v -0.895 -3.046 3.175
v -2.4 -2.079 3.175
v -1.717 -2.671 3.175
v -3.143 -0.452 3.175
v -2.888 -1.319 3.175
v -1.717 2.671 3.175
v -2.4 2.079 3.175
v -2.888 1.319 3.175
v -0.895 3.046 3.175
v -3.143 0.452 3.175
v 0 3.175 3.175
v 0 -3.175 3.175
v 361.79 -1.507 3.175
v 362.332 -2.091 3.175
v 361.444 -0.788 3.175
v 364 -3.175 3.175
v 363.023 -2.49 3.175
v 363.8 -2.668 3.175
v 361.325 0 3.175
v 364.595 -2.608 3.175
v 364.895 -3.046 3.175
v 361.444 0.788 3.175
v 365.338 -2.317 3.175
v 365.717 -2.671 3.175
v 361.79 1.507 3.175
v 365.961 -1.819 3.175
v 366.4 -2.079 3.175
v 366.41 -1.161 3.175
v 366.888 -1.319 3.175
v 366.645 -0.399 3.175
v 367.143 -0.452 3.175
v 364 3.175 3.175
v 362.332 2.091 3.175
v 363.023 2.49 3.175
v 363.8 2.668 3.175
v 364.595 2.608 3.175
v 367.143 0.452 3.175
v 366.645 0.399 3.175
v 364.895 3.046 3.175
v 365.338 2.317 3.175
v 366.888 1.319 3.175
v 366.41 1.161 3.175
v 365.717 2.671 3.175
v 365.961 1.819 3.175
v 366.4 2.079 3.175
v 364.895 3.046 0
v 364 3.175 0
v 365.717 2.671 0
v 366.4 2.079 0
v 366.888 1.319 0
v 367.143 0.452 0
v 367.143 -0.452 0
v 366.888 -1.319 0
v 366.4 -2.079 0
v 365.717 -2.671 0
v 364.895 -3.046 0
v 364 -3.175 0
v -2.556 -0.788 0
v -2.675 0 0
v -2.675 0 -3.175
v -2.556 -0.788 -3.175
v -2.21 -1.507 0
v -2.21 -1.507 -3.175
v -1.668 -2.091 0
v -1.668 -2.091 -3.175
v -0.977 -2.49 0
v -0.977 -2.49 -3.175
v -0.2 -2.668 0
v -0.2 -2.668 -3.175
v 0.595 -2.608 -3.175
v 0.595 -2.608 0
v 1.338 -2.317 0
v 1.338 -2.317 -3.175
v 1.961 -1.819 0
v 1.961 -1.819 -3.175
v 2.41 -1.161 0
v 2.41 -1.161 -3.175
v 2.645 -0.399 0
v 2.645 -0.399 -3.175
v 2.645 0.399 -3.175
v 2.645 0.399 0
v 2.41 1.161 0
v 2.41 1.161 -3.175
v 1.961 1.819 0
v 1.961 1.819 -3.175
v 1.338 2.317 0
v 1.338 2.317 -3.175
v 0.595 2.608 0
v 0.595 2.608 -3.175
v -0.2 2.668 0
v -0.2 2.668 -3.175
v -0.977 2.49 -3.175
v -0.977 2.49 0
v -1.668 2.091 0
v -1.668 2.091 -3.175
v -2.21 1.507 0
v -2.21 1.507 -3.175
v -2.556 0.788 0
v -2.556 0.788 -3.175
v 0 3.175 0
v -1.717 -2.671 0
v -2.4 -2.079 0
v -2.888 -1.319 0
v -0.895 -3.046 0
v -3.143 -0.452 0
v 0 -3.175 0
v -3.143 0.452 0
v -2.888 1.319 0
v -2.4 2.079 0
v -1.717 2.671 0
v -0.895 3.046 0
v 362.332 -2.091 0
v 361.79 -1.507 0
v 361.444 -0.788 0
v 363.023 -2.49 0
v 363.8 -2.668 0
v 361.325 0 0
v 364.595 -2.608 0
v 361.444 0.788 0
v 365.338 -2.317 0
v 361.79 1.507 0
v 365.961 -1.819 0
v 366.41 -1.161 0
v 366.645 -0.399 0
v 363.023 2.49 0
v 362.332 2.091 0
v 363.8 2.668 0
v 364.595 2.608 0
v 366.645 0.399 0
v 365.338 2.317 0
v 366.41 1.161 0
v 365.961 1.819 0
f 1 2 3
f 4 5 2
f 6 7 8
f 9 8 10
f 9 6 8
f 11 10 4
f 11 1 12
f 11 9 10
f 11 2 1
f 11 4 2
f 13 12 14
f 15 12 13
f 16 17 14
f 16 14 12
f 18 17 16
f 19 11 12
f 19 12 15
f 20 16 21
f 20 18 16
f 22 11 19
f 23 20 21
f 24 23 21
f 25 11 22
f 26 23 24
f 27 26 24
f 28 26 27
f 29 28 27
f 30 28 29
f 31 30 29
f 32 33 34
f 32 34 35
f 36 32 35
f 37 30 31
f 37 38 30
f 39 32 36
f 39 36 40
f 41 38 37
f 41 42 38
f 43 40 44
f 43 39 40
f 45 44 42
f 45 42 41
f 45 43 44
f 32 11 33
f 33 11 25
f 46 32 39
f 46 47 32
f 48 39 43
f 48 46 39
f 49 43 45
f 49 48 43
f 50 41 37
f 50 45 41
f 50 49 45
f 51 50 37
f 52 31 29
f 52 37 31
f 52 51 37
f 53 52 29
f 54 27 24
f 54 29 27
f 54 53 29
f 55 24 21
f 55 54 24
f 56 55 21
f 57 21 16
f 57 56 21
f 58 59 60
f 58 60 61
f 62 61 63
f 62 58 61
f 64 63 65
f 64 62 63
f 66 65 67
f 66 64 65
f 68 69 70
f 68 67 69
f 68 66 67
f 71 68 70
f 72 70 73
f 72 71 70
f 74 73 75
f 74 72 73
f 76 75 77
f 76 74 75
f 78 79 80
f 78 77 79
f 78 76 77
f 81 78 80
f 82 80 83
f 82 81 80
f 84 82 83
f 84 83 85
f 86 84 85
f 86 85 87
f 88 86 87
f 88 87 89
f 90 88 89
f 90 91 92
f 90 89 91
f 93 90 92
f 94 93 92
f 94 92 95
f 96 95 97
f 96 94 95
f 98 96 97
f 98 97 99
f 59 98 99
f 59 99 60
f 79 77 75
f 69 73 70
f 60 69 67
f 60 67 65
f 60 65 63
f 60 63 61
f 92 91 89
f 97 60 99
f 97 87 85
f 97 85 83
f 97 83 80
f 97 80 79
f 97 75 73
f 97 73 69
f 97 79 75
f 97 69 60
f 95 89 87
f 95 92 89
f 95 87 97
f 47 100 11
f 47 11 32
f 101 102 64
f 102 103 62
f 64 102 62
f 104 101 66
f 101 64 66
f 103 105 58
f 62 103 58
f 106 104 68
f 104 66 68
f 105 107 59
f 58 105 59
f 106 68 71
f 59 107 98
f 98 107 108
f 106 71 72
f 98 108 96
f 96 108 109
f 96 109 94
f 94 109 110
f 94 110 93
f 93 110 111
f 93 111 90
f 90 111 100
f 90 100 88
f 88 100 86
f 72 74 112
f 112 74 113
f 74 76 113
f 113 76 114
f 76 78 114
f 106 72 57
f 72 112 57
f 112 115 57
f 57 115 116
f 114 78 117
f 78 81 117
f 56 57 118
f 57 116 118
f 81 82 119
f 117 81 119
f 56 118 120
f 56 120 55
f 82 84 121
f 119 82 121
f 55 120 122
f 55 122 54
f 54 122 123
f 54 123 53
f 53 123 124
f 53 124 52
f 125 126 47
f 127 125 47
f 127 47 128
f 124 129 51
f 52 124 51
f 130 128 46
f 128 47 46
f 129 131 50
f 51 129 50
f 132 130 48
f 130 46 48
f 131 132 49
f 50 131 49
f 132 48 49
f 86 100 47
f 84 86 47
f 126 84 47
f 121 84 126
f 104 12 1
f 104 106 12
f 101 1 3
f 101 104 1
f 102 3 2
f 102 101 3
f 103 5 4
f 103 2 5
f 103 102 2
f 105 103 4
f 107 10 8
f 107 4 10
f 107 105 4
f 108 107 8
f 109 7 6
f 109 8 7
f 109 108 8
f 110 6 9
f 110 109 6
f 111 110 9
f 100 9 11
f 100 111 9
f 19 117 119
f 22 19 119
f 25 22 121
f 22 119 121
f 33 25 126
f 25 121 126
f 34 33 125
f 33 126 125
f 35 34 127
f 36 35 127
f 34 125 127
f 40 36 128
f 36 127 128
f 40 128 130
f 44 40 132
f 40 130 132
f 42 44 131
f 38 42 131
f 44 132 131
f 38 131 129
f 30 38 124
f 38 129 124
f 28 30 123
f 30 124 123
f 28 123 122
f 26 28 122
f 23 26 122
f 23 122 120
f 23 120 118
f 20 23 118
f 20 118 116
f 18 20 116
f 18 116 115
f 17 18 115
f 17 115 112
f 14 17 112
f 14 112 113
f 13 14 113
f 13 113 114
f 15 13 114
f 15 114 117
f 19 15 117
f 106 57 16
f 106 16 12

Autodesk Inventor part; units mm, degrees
ref_plane "YZ Plane" through (0, 0, 0) normal (1, 0, 0) x (0, 1, 0)
ref_plane "XZ Plane" through (0, 0, 0) normal (0, 1, 0) x (-1, 0, 0)
ref_plane "XY Plane" through (0, 0, 0) normal (0, 0, 1) x (1, 0, 0)
sketch "Boceto1" plane through (0, 0, 0) normal (0, 0, 1) x (1, 0, 0)
  arc A0 (0, 3.175) -> (0, -3.175) centre (0, 0) ccw
  line L0 (360.825, 0) -> (364, 0)
  arc A1 (364, -3.175) -> (364, 3.175) centre (364, 0) ccw
  line L1 (0, 3.175) -> (364, 3.175)
  line L2 (364, -3.175) -> (0, -3.175)
  dimension "d0" = 6.35
  dimension "d1" = 364
  dimension "d2" = 6.35
extrude "Extrusión1" add sketch "Boceto1" along normal blind 3.175
sketch "Boceto2" plane through (0, 0, 0) normal (0, 0, -1) x (-1, 0, 0)
  circle A0 centre (0, 0) radius 2.675
  dimension "d5" = 5.35
extrude "Extrusión2" add sketch "Boceto2" along normal blind 3.175
sketch "Boceto3" plane through (0, 0, 0) normal (0, 0, -1) x (-1, 0, 0)
  arc A0 (-364, 3.175) -> (-364, -3.175) centre (-364, 0) ccw projected
  circle A1 centre (-364, 0) radius 2.675
  point P0 (0, 0)
  dimension "d8" = 5.35
extrude "Extrusión3" cut sketch "Boceto3" against normal blind 3.175
properties part number "eslasbon_2" material "Plástico ABS"
